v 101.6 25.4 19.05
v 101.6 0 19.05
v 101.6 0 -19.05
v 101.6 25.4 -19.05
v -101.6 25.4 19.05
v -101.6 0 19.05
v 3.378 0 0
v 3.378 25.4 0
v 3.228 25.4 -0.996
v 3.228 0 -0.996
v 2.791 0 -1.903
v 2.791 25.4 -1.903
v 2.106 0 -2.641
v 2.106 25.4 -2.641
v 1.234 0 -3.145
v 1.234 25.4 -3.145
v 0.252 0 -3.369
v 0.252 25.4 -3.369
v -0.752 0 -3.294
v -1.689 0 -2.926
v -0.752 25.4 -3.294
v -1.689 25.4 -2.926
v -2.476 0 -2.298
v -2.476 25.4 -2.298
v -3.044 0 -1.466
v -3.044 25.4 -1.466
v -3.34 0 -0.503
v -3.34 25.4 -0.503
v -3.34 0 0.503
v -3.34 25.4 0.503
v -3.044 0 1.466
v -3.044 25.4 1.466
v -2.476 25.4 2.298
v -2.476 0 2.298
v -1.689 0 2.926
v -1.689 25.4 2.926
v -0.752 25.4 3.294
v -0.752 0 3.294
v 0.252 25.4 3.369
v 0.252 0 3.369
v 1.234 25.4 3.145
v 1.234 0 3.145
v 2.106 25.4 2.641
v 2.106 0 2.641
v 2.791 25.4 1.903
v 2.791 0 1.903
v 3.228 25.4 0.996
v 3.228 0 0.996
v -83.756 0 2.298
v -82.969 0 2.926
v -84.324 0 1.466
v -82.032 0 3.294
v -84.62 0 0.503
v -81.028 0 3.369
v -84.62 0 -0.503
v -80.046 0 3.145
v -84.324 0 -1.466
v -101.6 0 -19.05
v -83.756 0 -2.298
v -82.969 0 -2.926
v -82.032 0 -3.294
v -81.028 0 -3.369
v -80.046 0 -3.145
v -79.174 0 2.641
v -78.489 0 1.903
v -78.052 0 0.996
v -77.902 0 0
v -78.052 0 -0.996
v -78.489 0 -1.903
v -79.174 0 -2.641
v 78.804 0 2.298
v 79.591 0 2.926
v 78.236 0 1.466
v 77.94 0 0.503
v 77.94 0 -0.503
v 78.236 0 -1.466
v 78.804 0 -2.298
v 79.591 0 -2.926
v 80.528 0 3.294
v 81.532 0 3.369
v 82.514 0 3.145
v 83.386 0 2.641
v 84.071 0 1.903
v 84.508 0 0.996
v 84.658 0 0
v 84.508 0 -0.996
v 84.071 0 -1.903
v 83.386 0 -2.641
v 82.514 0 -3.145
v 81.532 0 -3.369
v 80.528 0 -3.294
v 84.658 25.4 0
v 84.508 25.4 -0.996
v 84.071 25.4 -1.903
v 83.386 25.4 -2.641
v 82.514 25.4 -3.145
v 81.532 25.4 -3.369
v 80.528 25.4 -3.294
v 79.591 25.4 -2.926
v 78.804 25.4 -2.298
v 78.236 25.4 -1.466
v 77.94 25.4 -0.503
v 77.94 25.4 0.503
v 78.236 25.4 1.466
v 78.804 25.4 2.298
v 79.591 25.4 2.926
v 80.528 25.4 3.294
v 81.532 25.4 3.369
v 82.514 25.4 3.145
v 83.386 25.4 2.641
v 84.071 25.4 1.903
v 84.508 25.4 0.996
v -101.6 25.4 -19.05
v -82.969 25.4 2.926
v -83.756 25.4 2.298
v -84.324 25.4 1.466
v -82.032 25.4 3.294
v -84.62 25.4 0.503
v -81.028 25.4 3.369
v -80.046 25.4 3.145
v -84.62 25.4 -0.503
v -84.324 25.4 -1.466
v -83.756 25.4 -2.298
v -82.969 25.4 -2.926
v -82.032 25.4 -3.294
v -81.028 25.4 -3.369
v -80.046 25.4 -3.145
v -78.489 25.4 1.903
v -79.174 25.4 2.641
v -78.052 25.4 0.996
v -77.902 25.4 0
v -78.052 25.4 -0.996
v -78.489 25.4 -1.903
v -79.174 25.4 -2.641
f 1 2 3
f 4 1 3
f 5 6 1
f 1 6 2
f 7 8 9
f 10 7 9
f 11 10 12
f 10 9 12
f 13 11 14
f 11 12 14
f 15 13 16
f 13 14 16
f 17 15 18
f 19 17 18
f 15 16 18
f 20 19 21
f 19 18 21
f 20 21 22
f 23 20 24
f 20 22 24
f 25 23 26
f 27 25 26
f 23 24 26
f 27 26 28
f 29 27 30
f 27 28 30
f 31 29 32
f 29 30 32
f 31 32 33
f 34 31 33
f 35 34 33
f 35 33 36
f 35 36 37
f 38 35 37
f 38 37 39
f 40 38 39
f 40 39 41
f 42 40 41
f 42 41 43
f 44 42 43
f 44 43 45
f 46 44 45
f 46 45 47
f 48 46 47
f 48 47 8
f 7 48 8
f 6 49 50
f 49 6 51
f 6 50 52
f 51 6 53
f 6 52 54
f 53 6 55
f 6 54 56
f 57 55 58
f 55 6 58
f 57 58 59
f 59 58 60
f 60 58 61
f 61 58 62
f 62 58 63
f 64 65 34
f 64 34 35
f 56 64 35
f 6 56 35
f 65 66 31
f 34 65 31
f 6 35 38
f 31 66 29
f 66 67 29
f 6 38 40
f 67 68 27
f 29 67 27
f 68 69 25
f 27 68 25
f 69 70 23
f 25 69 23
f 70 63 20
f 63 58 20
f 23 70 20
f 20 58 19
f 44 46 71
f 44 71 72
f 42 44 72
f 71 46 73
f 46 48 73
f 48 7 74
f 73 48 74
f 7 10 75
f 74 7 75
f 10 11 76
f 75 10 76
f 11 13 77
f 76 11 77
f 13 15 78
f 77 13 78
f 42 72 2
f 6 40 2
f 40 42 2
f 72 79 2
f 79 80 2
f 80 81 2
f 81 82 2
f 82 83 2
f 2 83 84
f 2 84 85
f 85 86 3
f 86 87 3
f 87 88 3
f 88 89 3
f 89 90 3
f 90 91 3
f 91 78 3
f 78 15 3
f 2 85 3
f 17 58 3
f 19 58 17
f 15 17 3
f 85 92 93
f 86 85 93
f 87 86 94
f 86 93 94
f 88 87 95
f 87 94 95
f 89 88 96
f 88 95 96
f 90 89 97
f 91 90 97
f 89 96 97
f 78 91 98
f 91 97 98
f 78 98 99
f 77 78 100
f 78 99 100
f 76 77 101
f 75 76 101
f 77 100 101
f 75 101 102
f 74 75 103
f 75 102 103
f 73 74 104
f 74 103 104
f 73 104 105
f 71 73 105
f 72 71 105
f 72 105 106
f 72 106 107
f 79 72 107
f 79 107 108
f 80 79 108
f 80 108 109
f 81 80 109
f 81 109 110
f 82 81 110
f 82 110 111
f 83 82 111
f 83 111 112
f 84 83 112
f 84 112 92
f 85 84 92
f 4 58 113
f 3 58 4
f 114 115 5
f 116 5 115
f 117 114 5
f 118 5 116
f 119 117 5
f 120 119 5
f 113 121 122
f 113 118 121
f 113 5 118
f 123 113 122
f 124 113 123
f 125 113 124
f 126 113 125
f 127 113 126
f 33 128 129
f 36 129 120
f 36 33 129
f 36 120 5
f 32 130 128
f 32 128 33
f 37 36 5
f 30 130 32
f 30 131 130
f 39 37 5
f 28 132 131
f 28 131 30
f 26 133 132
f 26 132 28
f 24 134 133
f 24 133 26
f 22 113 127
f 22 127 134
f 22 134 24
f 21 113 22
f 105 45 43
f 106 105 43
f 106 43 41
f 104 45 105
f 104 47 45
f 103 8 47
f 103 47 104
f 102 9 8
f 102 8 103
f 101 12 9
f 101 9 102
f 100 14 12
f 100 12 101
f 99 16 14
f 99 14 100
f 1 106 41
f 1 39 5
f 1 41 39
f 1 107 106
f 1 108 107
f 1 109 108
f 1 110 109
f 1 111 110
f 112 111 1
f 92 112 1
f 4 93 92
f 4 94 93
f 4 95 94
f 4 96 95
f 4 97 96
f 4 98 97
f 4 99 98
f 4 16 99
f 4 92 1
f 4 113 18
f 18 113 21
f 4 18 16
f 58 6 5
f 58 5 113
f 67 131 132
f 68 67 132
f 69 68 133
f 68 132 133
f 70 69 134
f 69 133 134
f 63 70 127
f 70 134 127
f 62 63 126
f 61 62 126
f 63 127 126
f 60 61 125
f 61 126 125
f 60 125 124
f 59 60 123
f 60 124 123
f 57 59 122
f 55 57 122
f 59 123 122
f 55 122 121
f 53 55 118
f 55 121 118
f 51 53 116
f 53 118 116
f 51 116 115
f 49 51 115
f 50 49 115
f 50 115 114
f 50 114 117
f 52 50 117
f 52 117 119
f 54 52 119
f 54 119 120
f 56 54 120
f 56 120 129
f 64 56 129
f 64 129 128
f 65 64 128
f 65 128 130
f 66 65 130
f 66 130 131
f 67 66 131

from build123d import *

# Parameters (mm, degrees)
SKETCH1_W           = 203.2
SKETCH1_H           = 38.1
BOSS_EXTRUDE1_DEPTH = 25.4
SKETCH2_R           = 3.3782
CUT_EXTRUDE1_DEPTH  = 26.4


with BuildPart() as part:
    # Sketch1 → Boss-Extrude1 (new body)
    with BuildSketch(Plane(origin=(0, 0, 0), x_dir=(1, 0, 0), z_dir=(0, 1, 0))):
        Rectangle(SKETCH1_W, SKETCH1_H)
    extrude(amount=BOSS_EXTRUDE1_DEPTH)

    # Sketch2 → Cut-Extrude1 (cut, through all)
    with BuildSketch(Plane(origin=(0, 25.4, 0), x_dir=(1, 0, 0), z_dir=(0, 1, 0))):
        Circle(SKETCH2_R)
        with Locations((-81.28, 0)):
            Circle(SKETCH2_R)
        with Locations((81.28, 0)):
            Circle(SKETCH2_R)
    extrude(amount=-CUT_EXTRUDE1_DEPTH, mode=Mode.SUBTRACT)


solid = part.part
